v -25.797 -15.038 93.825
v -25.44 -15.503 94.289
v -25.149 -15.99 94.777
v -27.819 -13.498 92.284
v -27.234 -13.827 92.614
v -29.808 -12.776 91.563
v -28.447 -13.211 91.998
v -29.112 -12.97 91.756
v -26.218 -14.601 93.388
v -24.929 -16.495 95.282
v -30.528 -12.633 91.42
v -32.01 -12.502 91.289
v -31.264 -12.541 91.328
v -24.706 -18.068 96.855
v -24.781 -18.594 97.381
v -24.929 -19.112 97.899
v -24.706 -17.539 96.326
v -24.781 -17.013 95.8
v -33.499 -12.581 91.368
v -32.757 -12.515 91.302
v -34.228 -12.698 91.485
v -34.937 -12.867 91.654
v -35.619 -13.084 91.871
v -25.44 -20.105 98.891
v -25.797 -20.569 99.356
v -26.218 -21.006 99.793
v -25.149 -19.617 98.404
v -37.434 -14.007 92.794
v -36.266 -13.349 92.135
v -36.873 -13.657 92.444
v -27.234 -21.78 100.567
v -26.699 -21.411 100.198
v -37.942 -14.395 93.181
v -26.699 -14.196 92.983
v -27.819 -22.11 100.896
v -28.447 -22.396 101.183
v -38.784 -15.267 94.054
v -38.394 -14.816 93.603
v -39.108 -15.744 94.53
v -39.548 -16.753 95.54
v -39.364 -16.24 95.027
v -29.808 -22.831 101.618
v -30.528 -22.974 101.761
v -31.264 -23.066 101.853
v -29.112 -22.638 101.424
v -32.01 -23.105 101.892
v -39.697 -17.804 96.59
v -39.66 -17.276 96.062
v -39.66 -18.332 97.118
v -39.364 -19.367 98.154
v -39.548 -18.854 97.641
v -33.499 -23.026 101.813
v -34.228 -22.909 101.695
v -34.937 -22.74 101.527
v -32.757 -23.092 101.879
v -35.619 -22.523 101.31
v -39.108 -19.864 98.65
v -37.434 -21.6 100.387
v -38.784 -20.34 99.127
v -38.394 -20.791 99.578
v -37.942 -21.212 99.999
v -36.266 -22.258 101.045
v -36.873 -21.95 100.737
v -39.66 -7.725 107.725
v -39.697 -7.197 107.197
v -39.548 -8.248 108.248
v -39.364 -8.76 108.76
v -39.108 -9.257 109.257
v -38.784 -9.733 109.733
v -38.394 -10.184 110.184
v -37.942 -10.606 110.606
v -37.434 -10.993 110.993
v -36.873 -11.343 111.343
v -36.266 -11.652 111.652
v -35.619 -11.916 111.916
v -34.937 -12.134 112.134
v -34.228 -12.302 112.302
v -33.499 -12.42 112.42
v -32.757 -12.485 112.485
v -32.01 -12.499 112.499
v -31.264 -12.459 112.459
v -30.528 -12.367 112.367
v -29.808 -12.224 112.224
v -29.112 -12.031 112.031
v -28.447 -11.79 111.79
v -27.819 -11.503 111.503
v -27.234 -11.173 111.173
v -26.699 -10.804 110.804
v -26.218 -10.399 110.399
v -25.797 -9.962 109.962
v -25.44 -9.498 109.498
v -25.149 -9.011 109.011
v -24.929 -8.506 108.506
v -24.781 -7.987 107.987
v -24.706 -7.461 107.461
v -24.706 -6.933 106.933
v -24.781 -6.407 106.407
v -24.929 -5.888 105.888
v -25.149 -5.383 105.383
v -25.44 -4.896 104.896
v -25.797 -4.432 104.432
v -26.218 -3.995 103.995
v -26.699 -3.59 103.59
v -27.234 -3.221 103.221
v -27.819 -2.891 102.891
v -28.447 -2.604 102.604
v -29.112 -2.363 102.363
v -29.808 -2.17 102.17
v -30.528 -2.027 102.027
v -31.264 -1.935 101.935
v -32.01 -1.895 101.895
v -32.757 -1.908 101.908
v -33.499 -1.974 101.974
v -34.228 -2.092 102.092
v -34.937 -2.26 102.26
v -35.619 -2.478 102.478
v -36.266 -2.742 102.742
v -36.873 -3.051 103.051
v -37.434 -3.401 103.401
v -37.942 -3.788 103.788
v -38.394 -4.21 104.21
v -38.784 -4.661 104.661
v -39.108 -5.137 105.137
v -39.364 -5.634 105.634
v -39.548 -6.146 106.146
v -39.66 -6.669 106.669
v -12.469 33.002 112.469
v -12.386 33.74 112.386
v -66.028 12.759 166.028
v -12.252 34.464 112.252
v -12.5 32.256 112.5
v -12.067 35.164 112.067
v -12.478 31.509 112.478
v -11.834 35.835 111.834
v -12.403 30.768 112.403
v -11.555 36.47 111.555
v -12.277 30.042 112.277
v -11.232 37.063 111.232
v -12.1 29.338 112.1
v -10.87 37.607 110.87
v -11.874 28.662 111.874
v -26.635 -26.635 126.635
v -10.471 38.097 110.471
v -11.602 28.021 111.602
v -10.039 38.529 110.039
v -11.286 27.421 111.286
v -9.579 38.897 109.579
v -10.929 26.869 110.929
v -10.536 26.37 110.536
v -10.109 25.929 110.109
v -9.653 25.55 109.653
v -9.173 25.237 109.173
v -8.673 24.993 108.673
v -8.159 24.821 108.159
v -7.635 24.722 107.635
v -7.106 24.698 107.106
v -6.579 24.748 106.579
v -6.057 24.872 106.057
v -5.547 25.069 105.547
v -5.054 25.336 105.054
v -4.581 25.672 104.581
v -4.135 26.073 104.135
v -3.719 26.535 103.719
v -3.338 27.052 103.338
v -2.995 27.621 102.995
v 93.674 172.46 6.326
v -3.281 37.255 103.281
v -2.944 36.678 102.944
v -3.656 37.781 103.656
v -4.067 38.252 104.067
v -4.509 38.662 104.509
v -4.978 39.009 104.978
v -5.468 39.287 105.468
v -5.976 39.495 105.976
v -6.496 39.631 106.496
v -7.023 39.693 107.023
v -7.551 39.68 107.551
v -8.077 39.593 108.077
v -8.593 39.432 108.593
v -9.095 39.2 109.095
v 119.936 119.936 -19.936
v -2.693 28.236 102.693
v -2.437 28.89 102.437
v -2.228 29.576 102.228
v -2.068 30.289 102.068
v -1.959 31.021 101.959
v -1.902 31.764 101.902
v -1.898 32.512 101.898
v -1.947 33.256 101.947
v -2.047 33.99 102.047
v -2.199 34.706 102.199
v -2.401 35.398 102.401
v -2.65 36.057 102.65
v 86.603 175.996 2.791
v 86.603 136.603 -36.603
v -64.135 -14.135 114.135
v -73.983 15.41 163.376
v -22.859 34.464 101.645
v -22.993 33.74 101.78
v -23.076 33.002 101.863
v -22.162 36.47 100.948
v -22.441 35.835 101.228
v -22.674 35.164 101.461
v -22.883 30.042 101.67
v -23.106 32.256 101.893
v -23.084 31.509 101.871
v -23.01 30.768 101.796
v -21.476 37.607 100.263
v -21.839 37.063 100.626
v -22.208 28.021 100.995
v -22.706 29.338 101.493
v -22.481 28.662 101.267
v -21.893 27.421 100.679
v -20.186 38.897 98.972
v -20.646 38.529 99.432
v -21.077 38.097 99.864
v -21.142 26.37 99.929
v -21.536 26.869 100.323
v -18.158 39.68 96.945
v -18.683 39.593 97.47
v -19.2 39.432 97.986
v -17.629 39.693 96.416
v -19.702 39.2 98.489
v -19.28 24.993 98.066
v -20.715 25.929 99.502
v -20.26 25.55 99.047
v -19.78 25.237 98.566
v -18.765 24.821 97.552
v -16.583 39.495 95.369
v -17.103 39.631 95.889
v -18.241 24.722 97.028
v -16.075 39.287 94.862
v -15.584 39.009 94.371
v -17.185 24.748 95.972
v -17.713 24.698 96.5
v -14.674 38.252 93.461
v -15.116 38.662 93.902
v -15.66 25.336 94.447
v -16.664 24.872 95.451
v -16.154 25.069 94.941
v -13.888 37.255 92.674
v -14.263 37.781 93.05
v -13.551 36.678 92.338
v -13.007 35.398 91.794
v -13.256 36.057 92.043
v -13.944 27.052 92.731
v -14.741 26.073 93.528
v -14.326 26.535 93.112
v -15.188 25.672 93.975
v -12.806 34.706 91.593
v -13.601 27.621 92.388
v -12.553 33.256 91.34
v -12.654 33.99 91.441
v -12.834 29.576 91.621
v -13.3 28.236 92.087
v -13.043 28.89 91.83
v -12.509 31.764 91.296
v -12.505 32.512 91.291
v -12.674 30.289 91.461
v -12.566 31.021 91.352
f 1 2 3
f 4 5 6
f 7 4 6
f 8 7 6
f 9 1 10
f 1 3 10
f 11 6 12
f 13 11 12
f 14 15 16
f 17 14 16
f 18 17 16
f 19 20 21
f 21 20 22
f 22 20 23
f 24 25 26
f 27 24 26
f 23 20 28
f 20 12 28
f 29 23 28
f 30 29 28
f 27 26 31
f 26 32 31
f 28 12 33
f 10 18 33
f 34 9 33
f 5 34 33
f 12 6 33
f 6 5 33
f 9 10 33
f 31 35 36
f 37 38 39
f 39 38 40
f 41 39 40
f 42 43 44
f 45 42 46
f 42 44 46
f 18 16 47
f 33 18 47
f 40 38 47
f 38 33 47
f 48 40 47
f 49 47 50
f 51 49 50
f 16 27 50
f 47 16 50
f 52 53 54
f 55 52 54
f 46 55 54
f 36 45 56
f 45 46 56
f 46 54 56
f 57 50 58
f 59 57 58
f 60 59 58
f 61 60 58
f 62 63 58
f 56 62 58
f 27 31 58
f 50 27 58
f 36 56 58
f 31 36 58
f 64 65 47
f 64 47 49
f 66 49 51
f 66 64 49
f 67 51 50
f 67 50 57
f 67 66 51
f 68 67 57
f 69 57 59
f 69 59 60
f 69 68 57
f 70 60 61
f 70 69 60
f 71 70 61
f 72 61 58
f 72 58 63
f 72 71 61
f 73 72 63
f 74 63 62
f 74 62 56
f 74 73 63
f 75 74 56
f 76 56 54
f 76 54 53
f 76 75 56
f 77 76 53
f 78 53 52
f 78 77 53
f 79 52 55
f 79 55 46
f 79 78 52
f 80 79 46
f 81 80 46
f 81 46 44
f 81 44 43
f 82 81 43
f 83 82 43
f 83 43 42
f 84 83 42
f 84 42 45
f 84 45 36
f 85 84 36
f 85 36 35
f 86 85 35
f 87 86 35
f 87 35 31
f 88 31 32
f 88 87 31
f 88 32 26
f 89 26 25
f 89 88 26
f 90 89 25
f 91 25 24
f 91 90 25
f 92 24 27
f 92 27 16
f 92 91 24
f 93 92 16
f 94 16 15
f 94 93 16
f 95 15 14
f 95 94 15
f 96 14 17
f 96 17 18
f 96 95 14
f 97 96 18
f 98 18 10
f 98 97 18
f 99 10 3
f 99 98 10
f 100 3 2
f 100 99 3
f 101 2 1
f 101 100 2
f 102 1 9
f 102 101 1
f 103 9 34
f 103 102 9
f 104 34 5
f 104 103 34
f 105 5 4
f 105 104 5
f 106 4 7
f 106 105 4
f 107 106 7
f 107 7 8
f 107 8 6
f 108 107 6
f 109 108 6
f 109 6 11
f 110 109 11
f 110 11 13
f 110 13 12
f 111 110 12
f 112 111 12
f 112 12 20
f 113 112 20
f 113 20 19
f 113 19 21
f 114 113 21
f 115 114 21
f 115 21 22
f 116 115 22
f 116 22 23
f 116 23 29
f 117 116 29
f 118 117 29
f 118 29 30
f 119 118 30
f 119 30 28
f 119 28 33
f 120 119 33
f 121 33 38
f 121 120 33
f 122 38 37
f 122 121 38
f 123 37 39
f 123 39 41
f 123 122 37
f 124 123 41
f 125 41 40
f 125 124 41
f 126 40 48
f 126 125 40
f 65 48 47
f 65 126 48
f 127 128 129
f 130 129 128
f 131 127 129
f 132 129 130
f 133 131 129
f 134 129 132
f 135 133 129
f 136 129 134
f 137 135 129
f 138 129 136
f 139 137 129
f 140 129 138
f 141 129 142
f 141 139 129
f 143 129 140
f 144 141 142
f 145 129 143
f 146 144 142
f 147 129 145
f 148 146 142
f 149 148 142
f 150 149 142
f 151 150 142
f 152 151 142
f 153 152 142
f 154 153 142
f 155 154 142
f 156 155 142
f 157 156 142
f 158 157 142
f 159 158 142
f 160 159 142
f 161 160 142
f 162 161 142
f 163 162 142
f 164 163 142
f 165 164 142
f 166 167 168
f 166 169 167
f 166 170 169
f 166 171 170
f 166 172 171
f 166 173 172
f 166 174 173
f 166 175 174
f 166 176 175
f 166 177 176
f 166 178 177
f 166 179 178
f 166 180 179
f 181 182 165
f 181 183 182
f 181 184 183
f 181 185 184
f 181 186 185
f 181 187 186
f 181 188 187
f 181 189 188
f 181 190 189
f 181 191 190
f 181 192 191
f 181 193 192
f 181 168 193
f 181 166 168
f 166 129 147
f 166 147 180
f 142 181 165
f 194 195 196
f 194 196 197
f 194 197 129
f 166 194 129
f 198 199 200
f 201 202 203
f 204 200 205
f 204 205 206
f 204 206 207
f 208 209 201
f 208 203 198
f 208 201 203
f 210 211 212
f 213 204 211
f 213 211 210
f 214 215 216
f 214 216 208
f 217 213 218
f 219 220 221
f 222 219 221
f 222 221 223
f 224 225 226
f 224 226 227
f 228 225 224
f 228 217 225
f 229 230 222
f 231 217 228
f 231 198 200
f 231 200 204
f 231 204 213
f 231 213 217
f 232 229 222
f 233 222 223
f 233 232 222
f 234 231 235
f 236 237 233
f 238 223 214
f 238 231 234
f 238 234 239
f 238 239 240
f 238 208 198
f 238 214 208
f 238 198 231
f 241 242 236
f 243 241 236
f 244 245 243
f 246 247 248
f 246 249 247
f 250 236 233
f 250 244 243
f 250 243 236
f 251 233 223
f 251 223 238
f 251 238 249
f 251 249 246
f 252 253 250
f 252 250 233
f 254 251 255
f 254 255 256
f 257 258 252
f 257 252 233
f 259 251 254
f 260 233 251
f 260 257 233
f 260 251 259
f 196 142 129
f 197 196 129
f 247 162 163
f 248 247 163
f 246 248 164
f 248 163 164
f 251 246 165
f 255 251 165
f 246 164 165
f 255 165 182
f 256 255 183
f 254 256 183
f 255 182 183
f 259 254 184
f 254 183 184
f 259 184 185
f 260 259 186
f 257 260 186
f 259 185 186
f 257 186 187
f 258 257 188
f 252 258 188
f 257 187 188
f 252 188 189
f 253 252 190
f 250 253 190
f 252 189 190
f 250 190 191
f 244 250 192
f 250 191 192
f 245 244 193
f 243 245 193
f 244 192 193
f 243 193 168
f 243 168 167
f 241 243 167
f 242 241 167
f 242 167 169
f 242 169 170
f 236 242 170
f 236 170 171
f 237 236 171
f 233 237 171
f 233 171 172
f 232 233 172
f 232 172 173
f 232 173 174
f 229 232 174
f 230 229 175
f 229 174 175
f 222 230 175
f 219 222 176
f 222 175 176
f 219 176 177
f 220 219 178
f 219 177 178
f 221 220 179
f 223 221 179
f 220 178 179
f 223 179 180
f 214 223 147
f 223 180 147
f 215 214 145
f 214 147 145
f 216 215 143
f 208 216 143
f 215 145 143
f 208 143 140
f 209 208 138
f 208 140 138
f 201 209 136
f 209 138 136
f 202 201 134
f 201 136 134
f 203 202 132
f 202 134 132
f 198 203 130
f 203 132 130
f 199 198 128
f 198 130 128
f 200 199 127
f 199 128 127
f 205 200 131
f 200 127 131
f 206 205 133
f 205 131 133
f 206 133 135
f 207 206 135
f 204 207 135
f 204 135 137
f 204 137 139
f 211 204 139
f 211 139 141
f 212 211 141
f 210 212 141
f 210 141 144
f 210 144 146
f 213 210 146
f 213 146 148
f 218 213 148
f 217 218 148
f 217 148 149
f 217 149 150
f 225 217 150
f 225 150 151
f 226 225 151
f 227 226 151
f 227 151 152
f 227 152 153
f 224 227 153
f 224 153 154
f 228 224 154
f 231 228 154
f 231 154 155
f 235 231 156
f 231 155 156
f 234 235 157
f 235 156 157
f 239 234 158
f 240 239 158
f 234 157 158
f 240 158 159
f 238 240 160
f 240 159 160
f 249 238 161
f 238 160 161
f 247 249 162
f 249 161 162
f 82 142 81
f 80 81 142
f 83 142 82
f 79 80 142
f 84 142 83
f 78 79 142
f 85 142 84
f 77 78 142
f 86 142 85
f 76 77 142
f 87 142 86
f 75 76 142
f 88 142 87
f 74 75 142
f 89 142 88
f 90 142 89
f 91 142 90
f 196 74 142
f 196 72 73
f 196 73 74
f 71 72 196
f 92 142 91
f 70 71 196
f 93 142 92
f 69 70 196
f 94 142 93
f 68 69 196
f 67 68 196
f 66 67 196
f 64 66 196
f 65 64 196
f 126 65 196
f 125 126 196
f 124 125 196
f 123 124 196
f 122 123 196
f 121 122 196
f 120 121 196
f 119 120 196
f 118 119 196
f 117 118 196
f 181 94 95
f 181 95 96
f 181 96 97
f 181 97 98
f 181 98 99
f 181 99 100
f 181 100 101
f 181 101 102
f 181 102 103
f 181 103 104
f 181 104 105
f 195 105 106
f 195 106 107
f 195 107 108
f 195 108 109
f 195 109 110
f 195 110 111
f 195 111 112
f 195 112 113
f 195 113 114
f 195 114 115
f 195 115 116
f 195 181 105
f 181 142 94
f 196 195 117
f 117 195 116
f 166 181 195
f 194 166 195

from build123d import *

# Parameters (mm, degrees)
PAD001_DEPTH            = 150
SKETCH001_R             = 7.5
PAD_DEPTH               = 15
SKETCH003_R             = 7.5
POCKET003_DEPTH         = 15
POCKET004_DEPTH         = 50
BODY004_PLACEMENT_ANGLE = 180


with BuildPart() as part:
    # Sketch002 (on DatumPlane) → Pad001 (new body, symmetric)
    with BuildSketch(Plane(origin=(0, -50, 50), x_dir=(0.8164965809, -0.4082482905, -0.4082482905), z_dir=(-0.5773502692, -0.5773502692, -0.5773502692))):
        Polygon((0, 0), (0, 55.7106781187), (-8.6602540378, 55.7106781187), (-40.8248290464, 0), align=None)
    extrude(amount=PAD001_DEPTH, both=True)

    # Sketch001 (on Face7 of Binder001) → Pad (join)
    with BuildSketch(Plane(origin=(0, -50, 50), x_dir=(1, 0, 0), z_dir=(0, -0.7071067812, 0.7071067812))):
        with Locations((32.1969593942, 80.8887157017)):
            Circle(SKETCH001_R)
    extrude(amount=-PAD_DEPTH)

    # Sketch003 (on Face6 of Pad) → Pocket003 (cut)
    with BuildSketch(Plane(origin=(-25, -50, 75), x_dir=(-0.4082482905, 0.8164965809, -0.4082482905), z_dir=(-0.7071067812, 0, 0.7071067812))):
        with Locations((-11.7521604853, -47.4562863756)):
            Circle(SKETCH003_R)
    extrude(amount=-POCKET003_DEPTH, mode=Mode.SUBTRACT)

    # Sketch005 (on Face6 of Pocket003) → Pocket004 (cut)
    with BuildSketch(Plane(origin=(-25, -50, 75), x_dir=(-0.4082482905, 0.8164965809, -0.4082482905), z_dir=(-0.7071067812, 0, 0.7071067812))):
        Polygon((20.4124145232, -103.8675134595), (-48.2468625128, -128.1422336512), (-48.2468625128, -150), (20.4124145232, -150), align=None)
    extrude(amount=-POCKET004_DEPTH, mode=Mode.SUBTRACT)


with BuildPart() as part_1:
    # Body004 placement: moved
    add(part.part.rotate(Axis((0, 0, 0), (0, 0, 1)), BODY004_PLACEMENT_ANGLE))


solid = part_1.part
